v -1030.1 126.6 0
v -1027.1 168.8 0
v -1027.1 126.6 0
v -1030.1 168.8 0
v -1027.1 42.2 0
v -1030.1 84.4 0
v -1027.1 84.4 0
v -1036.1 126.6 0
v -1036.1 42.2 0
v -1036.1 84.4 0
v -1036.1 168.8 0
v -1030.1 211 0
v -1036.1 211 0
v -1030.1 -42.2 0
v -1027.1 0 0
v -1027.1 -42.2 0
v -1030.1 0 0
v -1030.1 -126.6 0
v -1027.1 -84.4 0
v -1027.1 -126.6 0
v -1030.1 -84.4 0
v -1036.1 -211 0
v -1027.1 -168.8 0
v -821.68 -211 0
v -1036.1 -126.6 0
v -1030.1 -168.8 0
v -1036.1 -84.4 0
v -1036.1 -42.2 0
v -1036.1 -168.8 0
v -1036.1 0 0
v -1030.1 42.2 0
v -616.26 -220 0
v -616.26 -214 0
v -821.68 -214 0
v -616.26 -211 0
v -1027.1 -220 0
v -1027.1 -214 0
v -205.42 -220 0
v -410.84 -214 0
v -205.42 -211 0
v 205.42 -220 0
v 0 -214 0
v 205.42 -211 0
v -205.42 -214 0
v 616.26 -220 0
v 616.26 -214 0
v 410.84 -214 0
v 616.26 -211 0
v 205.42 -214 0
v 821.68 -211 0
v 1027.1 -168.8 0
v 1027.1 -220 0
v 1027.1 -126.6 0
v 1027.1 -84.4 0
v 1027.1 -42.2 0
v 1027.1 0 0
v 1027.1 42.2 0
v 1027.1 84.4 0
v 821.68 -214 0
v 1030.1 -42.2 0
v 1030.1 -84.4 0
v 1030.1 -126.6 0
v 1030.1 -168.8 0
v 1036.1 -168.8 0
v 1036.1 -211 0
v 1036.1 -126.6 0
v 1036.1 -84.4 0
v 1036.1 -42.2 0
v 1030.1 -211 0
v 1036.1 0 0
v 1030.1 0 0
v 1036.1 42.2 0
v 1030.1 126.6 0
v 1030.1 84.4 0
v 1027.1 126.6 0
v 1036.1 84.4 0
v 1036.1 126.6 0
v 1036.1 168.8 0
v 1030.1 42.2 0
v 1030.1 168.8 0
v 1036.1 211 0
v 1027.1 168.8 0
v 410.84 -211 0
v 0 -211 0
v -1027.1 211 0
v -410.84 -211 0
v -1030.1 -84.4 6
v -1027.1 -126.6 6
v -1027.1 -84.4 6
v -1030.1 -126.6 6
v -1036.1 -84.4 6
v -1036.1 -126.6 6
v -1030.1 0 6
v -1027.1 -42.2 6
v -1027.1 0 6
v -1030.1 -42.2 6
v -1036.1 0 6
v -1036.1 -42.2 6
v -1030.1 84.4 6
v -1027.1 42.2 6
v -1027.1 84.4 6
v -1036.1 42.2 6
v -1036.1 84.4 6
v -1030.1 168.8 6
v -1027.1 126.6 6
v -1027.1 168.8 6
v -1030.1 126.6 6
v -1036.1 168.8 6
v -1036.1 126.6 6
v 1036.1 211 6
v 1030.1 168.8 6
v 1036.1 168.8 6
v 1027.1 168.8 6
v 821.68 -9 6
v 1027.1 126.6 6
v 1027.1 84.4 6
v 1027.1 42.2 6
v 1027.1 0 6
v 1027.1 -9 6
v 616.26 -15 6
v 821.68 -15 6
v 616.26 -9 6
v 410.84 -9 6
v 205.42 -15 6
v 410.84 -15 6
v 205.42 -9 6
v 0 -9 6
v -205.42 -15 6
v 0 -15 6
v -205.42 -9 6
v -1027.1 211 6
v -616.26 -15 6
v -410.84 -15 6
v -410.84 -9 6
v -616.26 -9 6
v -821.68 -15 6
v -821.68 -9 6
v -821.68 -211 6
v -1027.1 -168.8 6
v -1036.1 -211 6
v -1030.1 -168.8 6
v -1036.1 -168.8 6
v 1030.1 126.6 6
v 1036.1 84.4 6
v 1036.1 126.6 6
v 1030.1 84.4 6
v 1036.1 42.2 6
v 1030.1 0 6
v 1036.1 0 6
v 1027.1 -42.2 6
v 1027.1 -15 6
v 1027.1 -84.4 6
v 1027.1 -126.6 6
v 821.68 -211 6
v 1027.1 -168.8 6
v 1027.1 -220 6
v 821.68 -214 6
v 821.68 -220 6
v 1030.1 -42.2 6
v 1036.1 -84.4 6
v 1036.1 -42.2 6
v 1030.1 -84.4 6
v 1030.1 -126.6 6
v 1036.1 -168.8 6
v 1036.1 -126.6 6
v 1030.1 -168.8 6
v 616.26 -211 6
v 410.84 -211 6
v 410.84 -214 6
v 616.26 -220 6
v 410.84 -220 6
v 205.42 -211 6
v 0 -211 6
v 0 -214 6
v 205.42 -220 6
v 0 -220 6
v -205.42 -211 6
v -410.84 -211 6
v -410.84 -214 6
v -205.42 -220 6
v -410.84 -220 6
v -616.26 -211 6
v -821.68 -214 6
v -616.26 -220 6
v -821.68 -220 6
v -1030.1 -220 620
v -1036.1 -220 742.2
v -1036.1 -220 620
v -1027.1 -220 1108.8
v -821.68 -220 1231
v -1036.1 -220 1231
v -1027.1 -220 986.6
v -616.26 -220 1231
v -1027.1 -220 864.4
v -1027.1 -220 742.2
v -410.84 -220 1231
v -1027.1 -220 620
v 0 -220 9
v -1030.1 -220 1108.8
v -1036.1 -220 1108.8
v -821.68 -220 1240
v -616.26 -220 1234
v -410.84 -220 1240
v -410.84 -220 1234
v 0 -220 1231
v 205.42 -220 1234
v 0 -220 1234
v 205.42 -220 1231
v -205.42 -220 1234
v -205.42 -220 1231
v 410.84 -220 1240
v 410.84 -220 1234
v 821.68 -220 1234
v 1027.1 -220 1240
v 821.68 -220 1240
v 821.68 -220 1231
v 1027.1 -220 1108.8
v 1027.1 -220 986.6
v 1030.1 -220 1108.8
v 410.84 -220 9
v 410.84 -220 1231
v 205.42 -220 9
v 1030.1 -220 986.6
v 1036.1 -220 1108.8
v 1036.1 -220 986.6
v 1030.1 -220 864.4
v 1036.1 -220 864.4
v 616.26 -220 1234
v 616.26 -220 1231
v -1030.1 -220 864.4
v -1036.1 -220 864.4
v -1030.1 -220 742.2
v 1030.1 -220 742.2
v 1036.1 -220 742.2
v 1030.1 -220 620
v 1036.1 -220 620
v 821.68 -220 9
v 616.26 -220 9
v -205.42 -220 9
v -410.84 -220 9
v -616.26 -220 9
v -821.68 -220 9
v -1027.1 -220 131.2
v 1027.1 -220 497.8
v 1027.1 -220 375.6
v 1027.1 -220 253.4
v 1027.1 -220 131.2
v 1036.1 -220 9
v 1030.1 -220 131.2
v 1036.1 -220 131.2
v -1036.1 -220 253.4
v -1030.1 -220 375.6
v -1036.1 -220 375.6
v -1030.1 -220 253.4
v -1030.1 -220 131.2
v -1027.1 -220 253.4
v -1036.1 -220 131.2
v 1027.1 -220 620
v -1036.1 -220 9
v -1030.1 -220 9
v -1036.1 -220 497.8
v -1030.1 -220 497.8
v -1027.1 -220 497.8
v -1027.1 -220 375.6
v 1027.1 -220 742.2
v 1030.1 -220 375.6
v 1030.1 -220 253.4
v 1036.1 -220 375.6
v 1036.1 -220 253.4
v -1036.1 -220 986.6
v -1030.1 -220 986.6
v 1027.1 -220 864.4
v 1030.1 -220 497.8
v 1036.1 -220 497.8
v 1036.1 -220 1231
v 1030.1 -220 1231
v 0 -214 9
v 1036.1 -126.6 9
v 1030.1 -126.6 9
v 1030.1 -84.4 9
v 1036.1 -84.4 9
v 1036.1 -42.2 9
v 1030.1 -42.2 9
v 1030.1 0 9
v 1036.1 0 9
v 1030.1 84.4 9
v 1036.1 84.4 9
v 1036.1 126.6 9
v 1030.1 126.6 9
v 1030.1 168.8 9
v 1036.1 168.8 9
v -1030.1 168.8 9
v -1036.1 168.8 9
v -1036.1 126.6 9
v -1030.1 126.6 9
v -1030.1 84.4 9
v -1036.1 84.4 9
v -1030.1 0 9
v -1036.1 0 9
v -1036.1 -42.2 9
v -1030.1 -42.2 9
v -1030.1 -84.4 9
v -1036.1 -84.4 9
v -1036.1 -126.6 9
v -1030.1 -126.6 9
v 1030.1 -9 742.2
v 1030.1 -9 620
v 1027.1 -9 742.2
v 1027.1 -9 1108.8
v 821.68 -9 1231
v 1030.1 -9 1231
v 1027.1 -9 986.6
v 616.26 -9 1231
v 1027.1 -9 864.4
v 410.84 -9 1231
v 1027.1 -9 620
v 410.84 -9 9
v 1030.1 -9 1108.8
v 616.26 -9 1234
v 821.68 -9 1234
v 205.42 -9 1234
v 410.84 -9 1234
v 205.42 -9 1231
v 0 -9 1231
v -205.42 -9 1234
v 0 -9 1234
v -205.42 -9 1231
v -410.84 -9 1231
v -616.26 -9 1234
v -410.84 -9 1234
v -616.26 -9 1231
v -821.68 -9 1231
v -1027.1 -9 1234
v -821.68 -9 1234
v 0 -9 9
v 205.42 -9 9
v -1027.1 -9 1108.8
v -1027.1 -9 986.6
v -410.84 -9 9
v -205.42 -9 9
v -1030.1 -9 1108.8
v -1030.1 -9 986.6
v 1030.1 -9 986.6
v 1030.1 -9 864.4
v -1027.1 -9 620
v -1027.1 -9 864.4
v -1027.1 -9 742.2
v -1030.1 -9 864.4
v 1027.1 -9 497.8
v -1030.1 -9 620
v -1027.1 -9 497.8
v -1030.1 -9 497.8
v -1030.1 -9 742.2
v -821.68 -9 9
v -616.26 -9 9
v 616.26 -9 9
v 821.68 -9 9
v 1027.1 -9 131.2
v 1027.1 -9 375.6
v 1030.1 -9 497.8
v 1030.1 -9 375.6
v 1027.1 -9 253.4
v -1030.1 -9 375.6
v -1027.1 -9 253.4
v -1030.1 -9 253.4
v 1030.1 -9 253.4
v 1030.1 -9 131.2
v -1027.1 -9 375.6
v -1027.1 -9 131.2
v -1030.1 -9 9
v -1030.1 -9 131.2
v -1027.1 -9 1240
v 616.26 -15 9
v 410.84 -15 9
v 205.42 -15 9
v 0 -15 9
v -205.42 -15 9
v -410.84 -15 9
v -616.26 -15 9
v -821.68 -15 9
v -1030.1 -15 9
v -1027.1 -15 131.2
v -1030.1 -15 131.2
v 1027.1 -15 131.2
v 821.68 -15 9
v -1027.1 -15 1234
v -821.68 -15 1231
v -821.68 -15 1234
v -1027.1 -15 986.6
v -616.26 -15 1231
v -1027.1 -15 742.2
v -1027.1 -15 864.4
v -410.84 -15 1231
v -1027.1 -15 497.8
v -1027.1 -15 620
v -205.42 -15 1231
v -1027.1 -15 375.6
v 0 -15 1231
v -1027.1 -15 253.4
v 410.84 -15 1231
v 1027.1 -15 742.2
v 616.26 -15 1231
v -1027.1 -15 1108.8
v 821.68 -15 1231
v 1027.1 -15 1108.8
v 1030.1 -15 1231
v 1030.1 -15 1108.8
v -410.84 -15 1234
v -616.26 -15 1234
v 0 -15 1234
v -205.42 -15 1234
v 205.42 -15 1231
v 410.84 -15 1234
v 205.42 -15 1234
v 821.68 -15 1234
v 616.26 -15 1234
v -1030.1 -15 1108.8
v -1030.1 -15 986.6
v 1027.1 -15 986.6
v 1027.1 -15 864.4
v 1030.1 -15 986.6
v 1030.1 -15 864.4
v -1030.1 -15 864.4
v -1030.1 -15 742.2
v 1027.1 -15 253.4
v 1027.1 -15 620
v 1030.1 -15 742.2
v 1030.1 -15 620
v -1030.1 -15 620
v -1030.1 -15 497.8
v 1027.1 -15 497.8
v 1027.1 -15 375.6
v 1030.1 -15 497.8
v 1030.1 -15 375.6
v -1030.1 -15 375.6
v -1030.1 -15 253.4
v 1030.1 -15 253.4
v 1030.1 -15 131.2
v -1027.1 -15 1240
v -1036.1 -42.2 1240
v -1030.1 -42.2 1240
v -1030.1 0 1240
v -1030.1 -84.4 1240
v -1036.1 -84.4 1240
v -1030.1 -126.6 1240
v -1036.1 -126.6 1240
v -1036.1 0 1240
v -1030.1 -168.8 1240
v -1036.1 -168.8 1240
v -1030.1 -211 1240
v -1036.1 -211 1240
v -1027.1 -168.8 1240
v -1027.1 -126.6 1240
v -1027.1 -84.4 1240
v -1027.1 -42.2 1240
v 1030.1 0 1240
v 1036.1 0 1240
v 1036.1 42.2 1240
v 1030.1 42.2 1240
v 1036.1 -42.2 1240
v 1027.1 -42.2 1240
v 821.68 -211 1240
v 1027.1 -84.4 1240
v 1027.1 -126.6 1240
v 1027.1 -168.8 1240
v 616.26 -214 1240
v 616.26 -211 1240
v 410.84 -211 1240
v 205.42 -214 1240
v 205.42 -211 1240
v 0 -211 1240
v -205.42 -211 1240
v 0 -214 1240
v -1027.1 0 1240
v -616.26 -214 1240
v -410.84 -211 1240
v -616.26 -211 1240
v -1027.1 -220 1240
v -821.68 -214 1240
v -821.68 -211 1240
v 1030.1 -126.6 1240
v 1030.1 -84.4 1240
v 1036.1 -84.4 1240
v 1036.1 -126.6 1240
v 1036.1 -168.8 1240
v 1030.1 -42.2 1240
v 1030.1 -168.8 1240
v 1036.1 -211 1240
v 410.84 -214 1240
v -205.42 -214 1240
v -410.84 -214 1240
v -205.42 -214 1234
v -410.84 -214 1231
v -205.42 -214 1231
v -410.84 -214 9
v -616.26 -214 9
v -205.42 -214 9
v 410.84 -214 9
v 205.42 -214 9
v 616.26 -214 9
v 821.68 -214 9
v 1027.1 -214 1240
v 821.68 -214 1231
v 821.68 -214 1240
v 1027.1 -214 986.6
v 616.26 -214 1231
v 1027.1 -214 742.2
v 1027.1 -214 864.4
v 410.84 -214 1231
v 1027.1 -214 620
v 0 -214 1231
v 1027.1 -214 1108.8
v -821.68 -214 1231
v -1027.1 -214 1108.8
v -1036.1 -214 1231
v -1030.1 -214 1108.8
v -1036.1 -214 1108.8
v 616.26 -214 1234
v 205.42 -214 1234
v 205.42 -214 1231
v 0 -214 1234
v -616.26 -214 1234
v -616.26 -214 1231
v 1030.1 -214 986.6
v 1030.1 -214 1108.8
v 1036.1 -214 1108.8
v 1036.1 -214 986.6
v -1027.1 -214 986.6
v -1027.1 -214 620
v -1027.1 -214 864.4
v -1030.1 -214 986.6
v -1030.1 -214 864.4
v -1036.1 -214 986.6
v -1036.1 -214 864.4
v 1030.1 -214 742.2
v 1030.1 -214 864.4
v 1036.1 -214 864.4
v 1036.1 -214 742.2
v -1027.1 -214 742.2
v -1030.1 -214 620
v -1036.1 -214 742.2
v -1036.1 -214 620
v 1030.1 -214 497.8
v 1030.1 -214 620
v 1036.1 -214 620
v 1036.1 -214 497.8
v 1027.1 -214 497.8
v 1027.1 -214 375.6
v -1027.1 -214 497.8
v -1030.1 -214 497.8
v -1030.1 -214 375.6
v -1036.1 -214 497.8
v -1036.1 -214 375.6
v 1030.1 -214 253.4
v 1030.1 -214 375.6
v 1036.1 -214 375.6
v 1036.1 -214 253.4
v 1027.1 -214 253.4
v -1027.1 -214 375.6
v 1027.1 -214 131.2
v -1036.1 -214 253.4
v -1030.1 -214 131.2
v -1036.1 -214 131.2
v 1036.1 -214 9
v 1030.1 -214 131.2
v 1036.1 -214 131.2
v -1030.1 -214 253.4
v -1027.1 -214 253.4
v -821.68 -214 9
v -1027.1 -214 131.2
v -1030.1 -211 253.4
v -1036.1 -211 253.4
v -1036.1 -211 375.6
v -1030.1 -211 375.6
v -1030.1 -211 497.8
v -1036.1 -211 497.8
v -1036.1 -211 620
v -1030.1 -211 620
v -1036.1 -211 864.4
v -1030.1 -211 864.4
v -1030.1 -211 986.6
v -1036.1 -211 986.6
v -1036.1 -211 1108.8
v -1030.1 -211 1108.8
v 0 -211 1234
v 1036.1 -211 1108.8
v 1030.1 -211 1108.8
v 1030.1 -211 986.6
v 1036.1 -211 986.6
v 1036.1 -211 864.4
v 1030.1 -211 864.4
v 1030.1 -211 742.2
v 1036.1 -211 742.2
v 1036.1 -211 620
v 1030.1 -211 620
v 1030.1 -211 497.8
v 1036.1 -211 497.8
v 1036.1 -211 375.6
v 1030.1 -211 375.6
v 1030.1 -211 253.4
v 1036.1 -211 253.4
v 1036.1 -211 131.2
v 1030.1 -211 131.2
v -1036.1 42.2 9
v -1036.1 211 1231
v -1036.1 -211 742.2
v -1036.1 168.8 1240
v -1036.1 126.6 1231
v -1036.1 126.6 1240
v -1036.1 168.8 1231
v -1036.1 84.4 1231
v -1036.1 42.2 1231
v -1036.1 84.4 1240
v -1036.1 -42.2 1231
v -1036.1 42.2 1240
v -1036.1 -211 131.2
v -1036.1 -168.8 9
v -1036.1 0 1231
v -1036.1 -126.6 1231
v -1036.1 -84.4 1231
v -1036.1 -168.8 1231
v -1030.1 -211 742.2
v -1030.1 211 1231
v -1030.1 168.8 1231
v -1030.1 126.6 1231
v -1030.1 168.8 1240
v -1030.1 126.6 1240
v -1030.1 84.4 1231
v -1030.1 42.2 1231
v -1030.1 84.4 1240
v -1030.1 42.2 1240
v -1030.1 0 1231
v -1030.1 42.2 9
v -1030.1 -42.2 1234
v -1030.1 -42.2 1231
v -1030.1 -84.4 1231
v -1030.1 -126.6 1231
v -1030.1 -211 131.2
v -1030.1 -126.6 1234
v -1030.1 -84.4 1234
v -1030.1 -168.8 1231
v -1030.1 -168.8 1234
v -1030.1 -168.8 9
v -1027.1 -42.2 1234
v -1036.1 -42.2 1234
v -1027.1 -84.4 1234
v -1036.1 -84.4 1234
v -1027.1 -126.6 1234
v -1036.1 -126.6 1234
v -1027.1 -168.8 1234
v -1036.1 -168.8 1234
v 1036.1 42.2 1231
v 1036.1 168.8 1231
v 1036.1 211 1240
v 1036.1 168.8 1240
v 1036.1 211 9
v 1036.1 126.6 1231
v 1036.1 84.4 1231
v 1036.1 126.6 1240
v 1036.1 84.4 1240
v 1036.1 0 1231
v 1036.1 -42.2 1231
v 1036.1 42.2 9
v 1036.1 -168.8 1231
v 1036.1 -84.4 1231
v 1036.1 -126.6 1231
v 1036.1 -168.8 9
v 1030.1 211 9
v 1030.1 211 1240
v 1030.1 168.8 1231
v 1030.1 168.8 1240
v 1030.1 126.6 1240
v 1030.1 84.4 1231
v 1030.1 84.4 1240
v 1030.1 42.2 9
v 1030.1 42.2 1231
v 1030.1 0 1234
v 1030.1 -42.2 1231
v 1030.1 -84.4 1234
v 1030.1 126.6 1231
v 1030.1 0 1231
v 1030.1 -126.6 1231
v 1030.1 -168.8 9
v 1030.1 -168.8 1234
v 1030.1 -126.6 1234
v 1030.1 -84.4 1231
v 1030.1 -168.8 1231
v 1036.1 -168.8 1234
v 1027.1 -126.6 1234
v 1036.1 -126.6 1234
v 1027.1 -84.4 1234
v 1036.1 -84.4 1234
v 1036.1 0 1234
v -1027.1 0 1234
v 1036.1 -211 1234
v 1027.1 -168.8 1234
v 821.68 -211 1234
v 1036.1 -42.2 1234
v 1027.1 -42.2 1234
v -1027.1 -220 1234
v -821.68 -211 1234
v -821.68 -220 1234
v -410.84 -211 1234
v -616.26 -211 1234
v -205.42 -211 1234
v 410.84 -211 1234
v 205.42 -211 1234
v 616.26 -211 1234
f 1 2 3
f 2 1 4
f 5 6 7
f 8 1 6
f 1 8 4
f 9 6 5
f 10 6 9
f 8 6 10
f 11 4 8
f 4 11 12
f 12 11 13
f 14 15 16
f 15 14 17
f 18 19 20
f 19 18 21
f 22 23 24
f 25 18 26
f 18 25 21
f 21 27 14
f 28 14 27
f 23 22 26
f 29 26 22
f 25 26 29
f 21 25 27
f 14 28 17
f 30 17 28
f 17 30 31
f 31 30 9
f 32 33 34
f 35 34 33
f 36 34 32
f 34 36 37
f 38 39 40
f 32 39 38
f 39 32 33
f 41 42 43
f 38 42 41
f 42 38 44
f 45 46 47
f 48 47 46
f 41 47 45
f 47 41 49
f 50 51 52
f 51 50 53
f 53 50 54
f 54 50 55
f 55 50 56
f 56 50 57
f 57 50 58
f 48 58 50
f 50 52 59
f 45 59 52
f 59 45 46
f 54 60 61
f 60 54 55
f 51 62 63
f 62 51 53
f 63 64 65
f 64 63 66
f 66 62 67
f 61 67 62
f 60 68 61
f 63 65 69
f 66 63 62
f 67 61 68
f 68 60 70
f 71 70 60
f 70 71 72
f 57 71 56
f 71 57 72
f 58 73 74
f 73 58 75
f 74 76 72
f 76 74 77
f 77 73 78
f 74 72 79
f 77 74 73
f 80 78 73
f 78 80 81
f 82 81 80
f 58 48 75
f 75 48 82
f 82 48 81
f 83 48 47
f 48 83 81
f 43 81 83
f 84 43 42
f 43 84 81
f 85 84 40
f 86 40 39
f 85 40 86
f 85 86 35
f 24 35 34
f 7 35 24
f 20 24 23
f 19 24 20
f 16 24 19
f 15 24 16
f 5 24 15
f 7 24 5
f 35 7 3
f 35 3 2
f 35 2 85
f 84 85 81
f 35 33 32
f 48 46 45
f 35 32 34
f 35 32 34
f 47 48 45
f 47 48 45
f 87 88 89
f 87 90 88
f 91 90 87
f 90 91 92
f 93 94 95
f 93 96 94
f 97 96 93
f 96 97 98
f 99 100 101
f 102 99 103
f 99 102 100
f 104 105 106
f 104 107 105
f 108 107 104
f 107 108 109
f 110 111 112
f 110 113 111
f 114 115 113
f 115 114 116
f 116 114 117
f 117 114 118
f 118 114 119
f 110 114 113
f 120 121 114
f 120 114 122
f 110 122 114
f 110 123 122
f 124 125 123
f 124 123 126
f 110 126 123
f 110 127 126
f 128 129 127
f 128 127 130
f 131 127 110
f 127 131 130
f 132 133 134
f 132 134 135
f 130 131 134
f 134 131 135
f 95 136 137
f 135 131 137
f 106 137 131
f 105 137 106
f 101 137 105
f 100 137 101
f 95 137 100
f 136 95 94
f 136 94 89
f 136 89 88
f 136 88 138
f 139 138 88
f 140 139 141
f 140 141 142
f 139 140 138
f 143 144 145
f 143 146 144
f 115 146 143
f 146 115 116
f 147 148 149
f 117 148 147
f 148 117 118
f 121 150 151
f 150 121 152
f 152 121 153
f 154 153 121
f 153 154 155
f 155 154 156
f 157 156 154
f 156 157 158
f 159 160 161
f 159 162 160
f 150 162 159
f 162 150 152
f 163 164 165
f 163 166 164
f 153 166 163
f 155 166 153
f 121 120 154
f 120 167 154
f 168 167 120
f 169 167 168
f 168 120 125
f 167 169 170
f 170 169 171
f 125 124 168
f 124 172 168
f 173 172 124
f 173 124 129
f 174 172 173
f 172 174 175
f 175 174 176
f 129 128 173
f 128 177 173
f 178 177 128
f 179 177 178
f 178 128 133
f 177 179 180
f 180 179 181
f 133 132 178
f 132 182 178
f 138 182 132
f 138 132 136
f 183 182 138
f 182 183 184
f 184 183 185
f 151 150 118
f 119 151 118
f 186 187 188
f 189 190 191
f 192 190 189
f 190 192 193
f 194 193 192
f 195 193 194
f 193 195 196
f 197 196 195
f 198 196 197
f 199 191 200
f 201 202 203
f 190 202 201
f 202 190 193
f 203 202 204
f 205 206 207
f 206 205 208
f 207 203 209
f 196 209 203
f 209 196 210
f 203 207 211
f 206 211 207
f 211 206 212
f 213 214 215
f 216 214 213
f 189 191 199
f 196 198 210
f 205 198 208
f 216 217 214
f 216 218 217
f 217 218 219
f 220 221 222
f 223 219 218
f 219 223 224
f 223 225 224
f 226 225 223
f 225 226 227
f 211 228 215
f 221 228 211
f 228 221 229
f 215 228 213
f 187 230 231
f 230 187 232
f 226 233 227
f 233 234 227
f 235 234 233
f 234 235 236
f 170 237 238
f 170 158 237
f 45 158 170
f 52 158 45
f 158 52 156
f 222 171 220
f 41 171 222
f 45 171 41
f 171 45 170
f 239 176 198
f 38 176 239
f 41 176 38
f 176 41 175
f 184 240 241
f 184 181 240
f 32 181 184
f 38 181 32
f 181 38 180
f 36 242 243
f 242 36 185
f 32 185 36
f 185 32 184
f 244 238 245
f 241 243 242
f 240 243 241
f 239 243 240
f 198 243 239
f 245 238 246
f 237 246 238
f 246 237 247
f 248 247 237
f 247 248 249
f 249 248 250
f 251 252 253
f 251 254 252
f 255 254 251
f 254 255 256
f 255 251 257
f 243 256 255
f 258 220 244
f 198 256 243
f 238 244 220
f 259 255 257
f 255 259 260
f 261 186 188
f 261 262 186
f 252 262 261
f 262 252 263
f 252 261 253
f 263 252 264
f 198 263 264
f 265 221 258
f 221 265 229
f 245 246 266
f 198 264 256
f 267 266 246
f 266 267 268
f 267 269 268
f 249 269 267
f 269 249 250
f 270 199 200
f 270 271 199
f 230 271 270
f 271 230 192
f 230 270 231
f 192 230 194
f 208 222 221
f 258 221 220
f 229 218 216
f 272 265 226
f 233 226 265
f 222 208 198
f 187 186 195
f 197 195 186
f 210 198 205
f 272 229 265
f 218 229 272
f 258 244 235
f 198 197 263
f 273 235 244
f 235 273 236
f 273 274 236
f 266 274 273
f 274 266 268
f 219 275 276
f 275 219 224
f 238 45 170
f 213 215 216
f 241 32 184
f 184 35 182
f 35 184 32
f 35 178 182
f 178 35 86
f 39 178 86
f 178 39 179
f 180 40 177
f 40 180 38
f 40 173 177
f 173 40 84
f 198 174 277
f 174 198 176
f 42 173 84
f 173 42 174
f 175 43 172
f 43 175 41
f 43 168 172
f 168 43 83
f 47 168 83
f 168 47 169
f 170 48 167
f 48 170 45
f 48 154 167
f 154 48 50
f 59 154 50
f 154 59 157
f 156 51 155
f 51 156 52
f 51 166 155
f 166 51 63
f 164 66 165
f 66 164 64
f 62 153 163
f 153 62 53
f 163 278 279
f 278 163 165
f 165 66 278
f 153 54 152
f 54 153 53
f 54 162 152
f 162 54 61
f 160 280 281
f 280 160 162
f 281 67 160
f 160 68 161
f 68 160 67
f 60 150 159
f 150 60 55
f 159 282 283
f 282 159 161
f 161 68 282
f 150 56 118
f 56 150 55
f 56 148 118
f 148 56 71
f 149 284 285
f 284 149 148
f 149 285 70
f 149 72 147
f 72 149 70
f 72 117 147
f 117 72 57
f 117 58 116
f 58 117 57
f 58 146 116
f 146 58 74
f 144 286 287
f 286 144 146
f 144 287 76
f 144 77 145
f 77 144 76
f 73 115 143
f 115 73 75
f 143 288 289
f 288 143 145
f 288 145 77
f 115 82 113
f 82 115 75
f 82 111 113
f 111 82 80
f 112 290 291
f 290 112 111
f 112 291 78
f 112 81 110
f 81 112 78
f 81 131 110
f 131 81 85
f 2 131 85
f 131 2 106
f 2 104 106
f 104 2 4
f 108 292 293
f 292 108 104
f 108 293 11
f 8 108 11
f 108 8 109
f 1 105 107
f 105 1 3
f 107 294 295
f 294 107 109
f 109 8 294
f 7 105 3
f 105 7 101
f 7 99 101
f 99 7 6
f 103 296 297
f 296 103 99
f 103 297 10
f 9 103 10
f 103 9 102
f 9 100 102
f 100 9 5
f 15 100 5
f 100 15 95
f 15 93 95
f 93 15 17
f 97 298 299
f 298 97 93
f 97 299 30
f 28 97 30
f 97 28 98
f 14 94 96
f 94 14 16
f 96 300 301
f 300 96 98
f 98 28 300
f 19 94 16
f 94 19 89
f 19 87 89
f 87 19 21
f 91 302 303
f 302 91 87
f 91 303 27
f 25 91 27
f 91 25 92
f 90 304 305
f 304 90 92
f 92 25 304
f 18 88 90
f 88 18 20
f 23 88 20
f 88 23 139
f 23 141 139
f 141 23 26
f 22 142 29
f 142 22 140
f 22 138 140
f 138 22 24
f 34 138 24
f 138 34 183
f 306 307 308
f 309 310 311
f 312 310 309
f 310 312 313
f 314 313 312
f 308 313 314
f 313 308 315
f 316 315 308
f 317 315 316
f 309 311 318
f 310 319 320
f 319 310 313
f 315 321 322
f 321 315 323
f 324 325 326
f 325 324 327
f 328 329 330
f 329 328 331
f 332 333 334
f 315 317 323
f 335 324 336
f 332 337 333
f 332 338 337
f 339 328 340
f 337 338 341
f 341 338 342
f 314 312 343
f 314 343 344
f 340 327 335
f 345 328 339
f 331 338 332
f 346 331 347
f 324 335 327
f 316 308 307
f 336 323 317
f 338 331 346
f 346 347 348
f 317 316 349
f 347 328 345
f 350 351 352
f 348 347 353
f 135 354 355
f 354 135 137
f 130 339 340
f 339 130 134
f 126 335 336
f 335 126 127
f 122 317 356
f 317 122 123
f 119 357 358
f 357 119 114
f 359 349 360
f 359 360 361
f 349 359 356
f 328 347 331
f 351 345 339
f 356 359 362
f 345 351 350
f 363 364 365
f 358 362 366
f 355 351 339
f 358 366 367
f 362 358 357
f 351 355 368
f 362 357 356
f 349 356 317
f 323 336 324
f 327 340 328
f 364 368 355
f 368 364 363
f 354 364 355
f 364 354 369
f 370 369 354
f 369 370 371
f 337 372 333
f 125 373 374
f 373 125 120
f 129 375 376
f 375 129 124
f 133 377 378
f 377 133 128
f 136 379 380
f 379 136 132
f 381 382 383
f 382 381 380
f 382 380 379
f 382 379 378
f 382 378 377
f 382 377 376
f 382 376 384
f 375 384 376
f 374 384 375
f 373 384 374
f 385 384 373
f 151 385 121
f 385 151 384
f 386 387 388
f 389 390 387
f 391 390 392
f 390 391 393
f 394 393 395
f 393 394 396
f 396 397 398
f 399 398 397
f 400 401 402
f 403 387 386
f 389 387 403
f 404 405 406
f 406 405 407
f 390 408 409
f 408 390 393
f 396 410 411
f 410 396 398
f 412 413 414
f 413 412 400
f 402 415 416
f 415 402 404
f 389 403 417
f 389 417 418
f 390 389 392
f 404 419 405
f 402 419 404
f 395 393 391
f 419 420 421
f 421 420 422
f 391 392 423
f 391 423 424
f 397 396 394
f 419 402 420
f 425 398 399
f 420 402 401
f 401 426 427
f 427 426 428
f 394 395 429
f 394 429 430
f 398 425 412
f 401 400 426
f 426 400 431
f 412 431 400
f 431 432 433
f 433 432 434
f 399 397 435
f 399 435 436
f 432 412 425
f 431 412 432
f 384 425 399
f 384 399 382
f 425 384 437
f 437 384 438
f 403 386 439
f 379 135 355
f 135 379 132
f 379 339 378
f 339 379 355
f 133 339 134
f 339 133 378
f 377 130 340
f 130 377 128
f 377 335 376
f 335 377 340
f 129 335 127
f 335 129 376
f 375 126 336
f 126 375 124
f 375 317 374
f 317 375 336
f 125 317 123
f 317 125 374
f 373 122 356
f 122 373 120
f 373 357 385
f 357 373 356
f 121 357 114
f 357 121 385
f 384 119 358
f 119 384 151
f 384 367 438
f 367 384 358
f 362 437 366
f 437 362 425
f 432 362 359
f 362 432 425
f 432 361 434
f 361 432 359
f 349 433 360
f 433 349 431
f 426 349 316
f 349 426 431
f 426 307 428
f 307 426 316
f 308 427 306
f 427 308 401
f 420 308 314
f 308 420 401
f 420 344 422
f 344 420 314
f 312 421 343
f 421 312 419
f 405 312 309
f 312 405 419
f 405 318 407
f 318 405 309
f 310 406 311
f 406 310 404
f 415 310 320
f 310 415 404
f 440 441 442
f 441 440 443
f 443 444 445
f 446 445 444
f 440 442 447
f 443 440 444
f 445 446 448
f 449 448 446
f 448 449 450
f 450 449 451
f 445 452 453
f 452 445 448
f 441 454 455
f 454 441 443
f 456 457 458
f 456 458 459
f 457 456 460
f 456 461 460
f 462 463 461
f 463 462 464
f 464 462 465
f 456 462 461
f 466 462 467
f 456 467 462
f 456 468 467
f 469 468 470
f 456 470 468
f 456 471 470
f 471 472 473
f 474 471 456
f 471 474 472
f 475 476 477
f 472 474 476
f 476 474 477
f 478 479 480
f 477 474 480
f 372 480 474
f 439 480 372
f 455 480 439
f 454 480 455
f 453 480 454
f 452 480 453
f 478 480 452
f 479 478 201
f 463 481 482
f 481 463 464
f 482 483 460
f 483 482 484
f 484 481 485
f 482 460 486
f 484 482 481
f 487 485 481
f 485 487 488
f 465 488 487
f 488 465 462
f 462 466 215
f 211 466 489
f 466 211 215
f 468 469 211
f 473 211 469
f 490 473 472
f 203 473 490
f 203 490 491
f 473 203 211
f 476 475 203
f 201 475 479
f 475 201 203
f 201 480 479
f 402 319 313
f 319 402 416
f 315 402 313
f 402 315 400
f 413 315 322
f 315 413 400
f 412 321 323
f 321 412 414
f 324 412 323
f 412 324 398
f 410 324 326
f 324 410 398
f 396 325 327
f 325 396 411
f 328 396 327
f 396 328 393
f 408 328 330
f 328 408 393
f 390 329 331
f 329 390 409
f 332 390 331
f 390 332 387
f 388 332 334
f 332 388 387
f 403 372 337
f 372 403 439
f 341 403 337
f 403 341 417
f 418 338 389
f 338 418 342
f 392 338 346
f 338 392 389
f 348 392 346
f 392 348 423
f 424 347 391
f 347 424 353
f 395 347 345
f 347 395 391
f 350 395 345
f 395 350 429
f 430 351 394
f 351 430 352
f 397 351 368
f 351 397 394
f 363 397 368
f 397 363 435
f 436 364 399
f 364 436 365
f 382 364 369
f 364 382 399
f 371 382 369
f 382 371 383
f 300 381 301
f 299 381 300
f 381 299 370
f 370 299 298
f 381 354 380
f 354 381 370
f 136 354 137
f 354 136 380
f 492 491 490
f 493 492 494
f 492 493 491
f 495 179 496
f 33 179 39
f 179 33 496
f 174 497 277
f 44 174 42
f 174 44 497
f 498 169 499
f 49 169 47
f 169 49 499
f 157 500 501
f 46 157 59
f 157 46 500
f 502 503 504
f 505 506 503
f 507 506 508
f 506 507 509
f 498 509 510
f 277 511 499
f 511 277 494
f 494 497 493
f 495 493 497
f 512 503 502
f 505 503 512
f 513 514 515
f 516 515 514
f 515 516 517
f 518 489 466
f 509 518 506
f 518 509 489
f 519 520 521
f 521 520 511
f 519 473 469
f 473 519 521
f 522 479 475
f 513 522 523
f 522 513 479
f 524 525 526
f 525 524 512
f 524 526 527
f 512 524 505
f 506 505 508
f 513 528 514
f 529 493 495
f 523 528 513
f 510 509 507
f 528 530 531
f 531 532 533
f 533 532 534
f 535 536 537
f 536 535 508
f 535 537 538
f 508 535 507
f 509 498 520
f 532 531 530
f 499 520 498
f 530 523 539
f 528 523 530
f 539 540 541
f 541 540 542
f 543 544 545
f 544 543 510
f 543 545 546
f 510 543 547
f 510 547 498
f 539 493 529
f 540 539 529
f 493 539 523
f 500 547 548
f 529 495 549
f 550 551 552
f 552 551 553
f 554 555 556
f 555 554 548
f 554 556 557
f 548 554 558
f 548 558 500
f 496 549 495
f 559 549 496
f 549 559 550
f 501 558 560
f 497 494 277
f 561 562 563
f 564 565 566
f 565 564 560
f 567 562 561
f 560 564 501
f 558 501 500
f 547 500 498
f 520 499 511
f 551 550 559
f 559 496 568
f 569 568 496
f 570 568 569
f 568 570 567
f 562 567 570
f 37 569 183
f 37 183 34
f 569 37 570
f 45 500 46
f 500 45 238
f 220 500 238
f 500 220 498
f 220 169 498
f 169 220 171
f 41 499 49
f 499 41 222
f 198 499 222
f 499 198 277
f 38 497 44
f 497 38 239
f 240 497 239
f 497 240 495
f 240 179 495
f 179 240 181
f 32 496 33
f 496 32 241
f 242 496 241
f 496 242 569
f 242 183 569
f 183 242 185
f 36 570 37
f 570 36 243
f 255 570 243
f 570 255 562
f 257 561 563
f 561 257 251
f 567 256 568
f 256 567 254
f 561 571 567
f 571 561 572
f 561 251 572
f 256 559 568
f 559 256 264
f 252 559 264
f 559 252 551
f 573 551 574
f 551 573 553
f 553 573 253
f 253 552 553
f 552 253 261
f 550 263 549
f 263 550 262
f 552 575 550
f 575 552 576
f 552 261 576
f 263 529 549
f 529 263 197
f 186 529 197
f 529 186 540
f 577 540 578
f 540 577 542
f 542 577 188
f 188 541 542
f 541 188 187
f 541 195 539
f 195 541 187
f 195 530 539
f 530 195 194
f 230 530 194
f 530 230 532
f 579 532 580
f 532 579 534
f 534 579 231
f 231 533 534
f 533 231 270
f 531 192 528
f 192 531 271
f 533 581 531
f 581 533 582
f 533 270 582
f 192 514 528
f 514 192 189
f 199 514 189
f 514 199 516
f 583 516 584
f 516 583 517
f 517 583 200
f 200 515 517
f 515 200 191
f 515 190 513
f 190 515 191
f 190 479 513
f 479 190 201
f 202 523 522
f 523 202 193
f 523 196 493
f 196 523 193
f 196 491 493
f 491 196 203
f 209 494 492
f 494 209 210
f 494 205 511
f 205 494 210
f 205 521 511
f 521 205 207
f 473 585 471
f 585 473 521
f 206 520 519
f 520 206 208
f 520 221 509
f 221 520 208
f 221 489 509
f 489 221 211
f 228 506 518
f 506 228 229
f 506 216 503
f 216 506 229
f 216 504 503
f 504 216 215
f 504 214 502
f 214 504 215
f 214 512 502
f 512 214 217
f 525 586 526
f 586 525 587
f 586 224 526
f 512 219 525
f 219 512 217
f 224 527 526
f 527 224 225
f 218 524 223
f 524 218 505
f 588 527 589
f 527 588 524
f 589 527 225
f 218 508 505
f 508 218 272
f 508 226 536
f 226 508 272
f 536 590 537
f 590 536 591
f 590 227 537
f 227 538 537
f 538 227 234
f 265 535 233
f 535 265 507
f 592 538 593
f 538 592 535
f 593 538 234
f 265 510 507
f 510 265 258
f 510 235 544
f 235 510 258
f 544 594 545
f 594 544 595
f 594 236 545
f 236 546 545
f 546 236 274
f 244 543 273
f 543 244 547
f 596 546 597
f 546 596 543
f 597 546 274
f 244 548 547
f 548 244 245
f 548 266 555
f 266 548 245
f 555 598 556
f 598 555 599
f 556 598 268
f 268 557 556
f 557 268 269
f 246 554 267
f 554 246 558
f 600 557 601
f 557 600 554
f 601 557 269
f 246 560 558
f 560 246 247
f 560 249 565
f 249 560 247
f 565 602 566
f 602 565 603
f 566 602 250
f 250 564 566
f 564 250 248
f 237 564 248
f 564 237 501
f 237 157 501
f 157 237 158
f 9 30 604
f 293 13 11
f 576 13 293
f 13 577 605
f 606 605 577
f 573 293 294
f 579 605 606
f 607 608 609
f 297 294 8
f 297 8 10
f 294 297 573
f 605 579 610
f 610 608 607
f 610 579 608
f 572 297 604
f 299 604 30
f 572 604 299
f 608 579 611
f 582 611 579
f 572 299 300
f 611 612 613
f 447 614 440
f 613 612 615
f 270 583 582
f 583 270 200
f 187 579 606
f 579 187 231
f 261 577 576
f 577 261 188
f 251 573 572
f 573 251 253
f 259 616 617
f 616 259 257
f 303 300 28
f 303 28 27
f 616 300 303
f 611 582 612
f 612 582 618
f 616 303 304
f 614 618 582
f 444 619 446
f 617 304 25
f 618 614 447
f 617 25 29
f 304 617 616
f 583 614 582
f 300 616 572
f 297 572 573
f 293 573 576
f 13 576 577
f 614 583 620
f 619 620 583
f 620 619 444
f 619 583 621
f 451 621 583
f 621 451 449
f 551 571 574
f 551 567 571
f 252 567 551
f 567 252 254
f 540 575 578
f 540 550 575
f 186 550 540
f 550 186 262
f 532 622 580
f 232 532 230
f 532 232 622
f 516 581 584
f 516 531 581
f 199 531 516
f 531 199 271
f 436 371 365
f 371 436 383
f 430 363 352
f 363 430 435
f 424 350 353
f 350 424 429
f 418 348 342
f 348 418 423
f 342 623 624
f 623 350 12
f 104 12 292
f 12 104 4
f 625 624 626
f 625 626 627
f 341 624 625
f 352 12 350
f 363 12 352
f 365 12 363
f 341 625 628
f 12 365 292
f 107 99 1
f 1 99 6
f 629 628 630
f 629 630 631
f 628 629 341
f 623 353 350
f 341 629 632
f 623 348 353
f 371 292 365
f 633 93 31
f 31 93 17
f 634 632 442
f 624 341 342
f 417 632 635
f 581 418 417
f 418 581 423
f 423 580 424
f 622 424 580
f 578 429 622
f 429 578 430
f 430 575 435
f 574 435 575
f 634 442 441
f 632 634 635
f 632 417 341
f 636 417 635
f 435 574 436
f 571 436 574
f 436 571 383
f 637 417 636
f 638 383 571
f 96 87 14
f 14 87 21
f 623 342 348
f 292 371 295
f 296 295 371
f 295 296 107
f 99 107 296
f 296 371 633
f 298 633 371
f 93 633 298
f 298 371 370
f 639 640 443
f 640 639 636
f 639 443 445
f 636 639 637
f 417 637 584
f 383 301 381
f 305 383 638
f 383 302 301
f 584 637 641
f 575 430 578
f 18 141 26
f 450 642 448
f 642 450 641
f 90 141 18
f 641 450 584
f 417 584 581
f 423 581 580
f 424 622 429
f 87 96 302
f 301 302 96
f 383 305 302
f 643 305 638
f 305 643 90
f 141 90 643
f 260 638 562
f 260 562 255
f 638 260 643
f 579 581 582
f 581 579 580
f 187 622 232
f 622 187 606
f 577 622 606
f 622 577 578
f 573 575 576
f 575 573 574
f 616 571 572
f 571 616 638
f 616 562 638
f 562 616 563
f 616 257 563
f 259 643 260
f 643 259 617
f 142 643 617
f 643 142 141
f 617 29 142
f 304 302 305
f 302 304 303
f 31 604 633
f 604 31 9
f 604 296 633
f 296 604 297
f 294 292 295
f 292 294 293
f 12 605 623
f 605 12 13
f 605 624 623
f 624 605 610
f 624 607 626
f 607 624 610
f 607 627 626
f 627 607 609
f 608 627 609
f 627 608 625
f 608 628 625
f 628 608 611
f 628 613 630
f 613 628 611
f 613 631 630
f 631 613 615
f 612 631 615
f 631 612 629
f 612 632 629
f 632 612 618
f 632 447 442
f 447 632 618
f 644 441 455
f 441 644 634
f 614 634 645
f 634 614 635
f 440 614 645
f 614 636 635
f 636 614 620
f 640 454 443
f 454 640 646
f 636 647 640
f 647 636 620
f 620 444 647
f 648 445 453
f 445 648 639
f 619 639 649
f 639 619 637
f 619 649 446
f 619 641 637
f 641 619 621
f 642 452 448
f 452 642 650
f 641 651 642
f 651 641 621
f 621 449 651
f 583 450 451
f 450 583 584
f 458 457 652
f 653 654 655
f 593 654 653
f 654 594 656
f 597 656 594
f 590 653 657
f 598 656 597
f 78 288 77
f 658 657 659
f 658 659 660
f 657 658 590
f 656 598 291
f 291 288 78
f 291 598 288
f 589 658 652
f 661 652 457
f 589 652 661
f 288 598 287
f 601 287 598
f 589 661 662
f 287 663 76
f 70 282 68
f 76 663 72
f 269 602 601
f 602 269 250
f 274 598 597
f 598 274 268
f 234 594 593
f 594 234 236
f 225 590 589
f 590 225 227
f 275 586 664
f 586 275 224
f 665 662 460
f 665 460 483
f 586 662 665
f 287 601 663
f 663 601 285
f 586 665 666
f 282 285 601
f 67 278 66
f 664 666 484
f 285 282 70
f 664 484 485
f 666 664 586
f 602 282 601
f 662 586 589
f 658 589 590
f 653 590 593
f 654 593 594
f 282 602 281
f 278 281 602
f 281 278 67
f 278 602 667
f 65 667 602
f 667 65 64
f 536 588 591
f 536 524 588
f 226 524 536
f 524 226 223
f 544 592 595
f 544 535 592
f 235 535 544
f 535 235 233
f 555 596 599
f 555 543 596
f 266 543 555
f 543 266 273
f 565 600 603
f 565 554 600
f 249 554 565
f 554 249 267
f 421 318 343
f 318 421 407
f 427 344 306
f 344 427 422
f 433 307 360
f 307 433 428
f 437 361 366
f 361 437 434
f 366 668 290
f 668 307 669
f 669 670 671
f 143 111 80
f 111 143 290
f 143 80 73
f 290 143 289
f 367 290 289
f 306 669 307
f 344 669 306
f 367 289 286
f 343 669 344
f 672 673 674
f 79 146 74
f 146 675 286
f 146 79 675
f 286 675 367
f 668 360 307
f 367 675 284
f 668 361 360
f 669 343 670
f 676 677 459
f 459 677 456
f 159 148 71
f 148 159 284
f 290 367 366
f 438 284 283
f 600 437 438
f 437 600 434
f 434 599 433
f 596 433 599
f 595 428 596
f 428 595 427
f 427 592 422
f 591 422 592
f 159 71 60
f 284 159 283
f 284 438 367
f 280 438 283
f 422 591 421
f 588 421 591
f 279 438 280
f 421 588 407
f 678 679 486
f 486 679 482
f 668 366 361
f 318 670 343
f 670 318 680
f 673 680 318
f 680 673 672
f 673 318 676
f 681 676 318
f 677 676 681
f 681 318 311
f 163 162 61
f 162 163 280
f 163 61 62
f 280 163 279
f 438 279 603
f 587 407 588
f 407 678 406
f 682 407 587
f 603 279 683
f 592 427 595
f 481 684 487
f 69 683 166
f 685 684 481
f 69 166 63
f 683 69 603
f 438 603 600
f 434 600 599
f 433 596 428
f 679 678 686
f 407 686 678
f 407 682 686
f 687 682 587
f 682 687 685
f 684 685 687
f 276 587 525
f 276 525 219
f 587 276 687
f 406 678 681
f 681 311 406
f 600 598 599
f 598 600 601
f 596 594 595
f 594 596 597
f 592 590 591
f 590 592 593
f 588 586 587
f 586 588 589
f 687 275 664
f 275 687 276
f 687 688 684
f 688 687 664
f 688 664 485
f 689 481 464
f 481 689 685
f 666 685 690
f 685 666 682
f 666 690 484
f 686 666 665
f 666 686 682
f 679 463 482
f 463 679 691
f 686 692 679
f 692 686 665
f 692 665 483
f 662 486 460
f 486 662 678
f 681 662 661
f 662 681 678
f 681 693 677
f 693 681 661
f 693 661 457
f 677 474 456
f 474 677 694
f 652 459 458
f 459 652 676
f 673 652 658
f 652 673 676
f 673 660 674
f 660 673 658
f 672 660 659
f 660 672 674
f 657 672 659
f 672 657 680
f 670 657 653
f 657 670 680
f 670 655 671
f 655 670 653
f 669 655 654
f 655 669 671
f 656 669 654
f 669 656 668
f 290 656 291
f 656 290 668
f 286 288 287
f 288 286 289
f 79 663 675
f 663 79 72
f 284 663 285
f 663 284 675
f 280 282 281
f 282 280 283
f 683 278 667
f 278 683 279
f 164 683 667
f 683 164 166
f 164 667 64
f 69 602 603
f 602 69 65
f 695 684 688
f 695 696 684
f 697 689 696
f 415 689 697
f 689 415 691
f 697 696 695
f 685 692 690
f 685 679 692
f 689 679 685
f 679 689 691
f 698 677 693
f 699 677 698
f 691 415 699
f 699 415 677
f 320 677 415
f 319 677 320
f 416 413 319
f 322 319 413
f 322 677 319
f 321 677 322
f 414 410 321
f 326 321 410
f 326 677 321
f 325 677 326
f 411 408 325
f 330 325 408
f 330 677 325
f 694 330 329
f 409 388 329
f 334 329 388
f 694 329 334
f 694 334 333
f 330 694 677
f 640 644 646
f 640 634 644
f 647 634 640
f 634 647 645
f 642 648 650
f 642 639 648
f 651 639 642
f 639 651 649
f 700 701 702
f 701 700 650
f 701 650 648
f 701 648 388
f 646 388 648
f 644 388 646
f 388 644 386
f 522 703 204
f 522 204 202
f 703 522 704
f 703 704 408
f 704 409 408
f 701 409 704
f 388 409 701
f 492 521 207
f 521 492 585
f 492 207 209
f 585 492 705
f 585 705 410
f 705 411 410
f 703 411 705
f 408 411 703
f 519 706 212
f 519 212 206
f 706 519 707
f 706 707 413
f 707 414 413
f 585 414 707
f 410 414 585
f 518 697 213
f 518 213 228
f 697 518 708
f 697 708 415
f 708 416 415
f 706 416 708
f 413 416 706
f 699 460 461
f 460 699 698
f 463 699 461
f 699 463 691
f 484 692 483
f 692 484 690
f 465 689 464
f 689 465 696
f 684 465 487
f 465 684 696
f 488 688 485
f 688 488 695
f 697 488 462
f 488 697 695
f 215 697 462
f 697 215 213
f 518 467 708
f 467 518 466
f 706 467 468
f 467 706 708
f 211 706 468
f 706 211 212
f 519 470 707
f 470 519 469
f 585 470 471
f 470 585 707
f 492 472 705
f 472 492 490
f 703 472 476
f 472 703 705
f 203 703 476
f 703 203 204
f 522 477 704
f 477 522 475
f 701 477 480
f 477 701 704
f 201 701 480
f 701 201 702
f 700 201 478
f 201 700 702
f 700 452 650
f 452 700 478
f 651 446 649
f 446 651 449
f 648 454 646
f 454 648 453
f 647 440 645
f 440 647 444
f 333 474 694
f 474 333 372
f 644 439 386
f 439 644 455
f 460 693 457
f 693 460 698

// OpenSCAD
/*
     -/+oooo+:.     
  `/syo/:::/+syo-   
 `sy+.     ```-sy/  
 +y+      +::+`-yy- 
 sy-      +-:o:-oy/ 
 sy-       ``   +y/ 
 sy-            /y/ 
 sy-            /y/ 
 sy.            /y/ 
 sy/............oy/ 
 sysoooooooooooosy/ 
`sy/............oy+ 
syyyssssssssssssyyy/
/++++oys++++yy+++++-
     /y+    yy.     
     /y+    yy.     
     `-`    ss` 
    
     IDEA 1.61        
*/


//modulos para el renderizado de varios tipos de caja a manufacturear en la máquina de corte lAser

//Largo se desplaza en "X"
//Ancho se desplaza en "Y"

module base(largo=80,ancho=80,espesor=3,dientes=20,Up=1,Down=1,Left=1,Right=1){
tamDientesLargo=(largo)/dientes;
tamDientesAncho=(ancho)/dientes;


union(){

//Dientes derecha
  if(Right==1){
    translate([largo/2,-ancho/2-tamDientesAncho/2])
    for(i=[1:dientes/2]){
       translate([0,tamDientesAncho*2*i])
       square([2*espesor,tamDientesAncho],center=true);
    }
}

//Dientes Izquierda

if(Left==1){
   translate([-largo/2,-ancho/2-3*tamDientesAncho/2])
   for(i=[1:dientes/2]){
      translate([0,tamDientesAncho*2*i])
      square([2*espesor,tamDientesAncho],center=true);
   }
}

//Dientes Arriba

if(Up==1){
   translate([-largo/2-3*tamDientesLargo/2,ancho/2])
   for(i=[1:dientes/2]){
     translate([tamDientesLargo*2*i,0])
     square([tamDientesLargo,2*espesor],center=true);
   }
}

//Dientes Abajo

if(Down==1){
   translate([-largo/2-tamDientesLargo/2,-ancho/2])
    for(i=[1:dientes/2]){
     translate([tamDientesLargo*2*i,0])
     square([tamDientesLargo,2*espesor],center=true);
    }
}

//Cuadrado
square([largo,ancho],center=true);
}

}//Fin module base


//#####CAJA SIN O CON TAPA####//

module cajaSCTapa (largo=40,ancho=30,alto=40,espesor=3,dientes=6,modo=1,
  tolBisagras=2.2){

//base
        
    if(modo==2){
    base(largo,ancho,espesor,dientes,1,1,0,0);
        }
       else{
        base(largo,ancho,espesor,dientes,1,1,1,1);
           }
    
//Tapa
    
 if(modo==1){
    translate([((largo)+(2.5*espesor)),0])
    square([largo,ancho],center=true);
    
    translate([((largo)+(2.5*espesor)),-ancho/2+(1.5*espesor)])
    square([largo+2*espesor,espesor],center=true);
  
     translate([((largo)+(2.5*espesor)),+ancho/2])
    square([2*espesor,2*espesor],center=true);
 
     //}

//lados largo
 
 //if(modo==1){
 
    translate([0,(ancho+alto)/2+(2.5*espesor)])
   difference(){
       for(i=[0:1]){
          translate([((i*largo)+(i*2.5*  espesor)),0])
           difference(){
          base(largo,alto,espesor,dientes,0,  1,1,1);
               translate([0,(alto)/2])
           square([i*2*espesor,i*2*espesor],center=true);
            }
       }
       
       
     translate([0,alto])
    square([2*espesor,2*espesor],center=true);
   }
   
   //lados alto
  
      //reinicio
    translate([0,-ancho-(2.5*espesor)])
 difference(){
  union(){
   for(i=[0:1]){
      translate([((i*alto)+(i*2.5*espesor)),0])
     base(alto,ancho,espesor,dientes,1,1,0,1);
   }
   //circulos orillas (Material)
   
   translate([-((alto-espesor)/2),(ancho/2)-(1.5*espesor)])
   circle($fn=100,r=2*(espesor/2+0.5));
   
   translate([-(((alto-espesor)/2))+alto+(2.5*espesor),-(ancho/2)+(1.5*espesor)])
   circle($fn=100,r=2*(espesor/2+0.5));
   
  }
  
  //taladros bisagras
  
  
   translate([-(((alto-espesor)/2)),(ancho/2)-(1.5*espesor)])
   circle($fn=100,r=(espesor/2+0.5)-tolBisagras);
  
  translate([-(((alto-espesor)/2))+alto+(2.5*espesor),-(ancho/2)+(1.5*espesor)])
   circle($fn=100,r=(espesor/2+0.5)-tolBisagras);


 
  }
  
 
   
 }//fin modo 1
 
 
 if(modo==2){
      translate([0,(ancho+alto)/2+(2.5*espesor)])
   for(i=[0:1]){
      translate([((i*largo)+(i*2.5*  espesor)),0])
      base(largo,alto,espesor,dientes,0,  1,0,0);   
   }
 
 } 
 
 /*else{
     
 translate([0,(ancho+alto)/2+(2.5*espesor)])
   for(i=[0:1]){
      translate([((i*largo)+(i*2.5*  espesor)),0])
       
      base(largo,alto,espesor,dientes,0,  1,1,1);
        
   }
 
  }*/




 if(modo==2){
 //no hay reinicio
 //No dibujar nada en modo 2
 }
 
 if(modo==0){
   //reinicio
   translate([0,-ancho-(2.5*espesor)])
     for(i=[0:1]){
      translate([((i*alto)+(i*2.5*espesor)),0])
     base(alto,ancho,espesor,dientes,1,1,0,1);
   }
 }
  
  
}//Fin module cajaSCTapa

//####RENDERIZADOS#####//

//$1000 pino o MDF 1.22x2.44mm

module Armado(){
    //lonTotXm=2072.2mm;
    //lonProfunidadCyan=440mm;
    //alto 1240
    espesor=9;

    lonX=2072.2-(2*espesor);
    lonY=440-(2*espesor);
    lonZ=1240-(2*espesor);


    //base
    color("cyan",alpha=0.5)
    linear_extrude(height=6)
    base(lonX,lonY,espesor,10,0,1,1,1);

    //pared mayor (refuerzo)
    color("green",alpha=0.5)
    translate([0,-espesor,(lonZ/2)+espesor])
    rotate([90,0,0])
    linear_extrude(height=6)
    base(lonX,lonZ,espesor,10,1,1,1,1);

    //pared mayor 2
    color("green",alpha=0.5)
    translate([0,-(lonY/2)-espesor,(lonZ/2)+espesor])
    rotate([90,0,180])
    linear_extrude(height=6)
    base(lonX,lonZ,espesor,10,1,1,1,1);

    //pared menor 1
    color("orange",alpha=0.5)
    translate([-(lonX/2)-espesor,0,(lonZ/2)+espesor])
    rotate([90,0,90])
    linear_extrude(height=6)
    base(lonY,lonZ,espesor,10,1,1,1,0);

    //pared menor 2
    color("orange",alpha=0.5)
    translate([(lonX/2)+espesor,0,(lonZ/2)+espesor])
    rotate([270,0,90])
    linear_extrude(height=6)
    base(lonY,lonZ,espesor,10,1,1,1,0);

    //tapa 
    color("cyan",alpha=0.5)
    translate([0,0,lonZ+(espesor*2)])
    rotate([180,0,0])
    linear_extrude(height=6)
    difference(){
       base(lonX,lonY,espesor,10,1,0,1,1);
        translate([0,-500])
       square([4000,1000],center=true);
    }

}


 Armado();


//linear_extrude(height=3)
//cajaSCTapa(largo=110,ancho=80,alto=50,espesor=6,dientes=4,modo=0,tolBisagras=0);
